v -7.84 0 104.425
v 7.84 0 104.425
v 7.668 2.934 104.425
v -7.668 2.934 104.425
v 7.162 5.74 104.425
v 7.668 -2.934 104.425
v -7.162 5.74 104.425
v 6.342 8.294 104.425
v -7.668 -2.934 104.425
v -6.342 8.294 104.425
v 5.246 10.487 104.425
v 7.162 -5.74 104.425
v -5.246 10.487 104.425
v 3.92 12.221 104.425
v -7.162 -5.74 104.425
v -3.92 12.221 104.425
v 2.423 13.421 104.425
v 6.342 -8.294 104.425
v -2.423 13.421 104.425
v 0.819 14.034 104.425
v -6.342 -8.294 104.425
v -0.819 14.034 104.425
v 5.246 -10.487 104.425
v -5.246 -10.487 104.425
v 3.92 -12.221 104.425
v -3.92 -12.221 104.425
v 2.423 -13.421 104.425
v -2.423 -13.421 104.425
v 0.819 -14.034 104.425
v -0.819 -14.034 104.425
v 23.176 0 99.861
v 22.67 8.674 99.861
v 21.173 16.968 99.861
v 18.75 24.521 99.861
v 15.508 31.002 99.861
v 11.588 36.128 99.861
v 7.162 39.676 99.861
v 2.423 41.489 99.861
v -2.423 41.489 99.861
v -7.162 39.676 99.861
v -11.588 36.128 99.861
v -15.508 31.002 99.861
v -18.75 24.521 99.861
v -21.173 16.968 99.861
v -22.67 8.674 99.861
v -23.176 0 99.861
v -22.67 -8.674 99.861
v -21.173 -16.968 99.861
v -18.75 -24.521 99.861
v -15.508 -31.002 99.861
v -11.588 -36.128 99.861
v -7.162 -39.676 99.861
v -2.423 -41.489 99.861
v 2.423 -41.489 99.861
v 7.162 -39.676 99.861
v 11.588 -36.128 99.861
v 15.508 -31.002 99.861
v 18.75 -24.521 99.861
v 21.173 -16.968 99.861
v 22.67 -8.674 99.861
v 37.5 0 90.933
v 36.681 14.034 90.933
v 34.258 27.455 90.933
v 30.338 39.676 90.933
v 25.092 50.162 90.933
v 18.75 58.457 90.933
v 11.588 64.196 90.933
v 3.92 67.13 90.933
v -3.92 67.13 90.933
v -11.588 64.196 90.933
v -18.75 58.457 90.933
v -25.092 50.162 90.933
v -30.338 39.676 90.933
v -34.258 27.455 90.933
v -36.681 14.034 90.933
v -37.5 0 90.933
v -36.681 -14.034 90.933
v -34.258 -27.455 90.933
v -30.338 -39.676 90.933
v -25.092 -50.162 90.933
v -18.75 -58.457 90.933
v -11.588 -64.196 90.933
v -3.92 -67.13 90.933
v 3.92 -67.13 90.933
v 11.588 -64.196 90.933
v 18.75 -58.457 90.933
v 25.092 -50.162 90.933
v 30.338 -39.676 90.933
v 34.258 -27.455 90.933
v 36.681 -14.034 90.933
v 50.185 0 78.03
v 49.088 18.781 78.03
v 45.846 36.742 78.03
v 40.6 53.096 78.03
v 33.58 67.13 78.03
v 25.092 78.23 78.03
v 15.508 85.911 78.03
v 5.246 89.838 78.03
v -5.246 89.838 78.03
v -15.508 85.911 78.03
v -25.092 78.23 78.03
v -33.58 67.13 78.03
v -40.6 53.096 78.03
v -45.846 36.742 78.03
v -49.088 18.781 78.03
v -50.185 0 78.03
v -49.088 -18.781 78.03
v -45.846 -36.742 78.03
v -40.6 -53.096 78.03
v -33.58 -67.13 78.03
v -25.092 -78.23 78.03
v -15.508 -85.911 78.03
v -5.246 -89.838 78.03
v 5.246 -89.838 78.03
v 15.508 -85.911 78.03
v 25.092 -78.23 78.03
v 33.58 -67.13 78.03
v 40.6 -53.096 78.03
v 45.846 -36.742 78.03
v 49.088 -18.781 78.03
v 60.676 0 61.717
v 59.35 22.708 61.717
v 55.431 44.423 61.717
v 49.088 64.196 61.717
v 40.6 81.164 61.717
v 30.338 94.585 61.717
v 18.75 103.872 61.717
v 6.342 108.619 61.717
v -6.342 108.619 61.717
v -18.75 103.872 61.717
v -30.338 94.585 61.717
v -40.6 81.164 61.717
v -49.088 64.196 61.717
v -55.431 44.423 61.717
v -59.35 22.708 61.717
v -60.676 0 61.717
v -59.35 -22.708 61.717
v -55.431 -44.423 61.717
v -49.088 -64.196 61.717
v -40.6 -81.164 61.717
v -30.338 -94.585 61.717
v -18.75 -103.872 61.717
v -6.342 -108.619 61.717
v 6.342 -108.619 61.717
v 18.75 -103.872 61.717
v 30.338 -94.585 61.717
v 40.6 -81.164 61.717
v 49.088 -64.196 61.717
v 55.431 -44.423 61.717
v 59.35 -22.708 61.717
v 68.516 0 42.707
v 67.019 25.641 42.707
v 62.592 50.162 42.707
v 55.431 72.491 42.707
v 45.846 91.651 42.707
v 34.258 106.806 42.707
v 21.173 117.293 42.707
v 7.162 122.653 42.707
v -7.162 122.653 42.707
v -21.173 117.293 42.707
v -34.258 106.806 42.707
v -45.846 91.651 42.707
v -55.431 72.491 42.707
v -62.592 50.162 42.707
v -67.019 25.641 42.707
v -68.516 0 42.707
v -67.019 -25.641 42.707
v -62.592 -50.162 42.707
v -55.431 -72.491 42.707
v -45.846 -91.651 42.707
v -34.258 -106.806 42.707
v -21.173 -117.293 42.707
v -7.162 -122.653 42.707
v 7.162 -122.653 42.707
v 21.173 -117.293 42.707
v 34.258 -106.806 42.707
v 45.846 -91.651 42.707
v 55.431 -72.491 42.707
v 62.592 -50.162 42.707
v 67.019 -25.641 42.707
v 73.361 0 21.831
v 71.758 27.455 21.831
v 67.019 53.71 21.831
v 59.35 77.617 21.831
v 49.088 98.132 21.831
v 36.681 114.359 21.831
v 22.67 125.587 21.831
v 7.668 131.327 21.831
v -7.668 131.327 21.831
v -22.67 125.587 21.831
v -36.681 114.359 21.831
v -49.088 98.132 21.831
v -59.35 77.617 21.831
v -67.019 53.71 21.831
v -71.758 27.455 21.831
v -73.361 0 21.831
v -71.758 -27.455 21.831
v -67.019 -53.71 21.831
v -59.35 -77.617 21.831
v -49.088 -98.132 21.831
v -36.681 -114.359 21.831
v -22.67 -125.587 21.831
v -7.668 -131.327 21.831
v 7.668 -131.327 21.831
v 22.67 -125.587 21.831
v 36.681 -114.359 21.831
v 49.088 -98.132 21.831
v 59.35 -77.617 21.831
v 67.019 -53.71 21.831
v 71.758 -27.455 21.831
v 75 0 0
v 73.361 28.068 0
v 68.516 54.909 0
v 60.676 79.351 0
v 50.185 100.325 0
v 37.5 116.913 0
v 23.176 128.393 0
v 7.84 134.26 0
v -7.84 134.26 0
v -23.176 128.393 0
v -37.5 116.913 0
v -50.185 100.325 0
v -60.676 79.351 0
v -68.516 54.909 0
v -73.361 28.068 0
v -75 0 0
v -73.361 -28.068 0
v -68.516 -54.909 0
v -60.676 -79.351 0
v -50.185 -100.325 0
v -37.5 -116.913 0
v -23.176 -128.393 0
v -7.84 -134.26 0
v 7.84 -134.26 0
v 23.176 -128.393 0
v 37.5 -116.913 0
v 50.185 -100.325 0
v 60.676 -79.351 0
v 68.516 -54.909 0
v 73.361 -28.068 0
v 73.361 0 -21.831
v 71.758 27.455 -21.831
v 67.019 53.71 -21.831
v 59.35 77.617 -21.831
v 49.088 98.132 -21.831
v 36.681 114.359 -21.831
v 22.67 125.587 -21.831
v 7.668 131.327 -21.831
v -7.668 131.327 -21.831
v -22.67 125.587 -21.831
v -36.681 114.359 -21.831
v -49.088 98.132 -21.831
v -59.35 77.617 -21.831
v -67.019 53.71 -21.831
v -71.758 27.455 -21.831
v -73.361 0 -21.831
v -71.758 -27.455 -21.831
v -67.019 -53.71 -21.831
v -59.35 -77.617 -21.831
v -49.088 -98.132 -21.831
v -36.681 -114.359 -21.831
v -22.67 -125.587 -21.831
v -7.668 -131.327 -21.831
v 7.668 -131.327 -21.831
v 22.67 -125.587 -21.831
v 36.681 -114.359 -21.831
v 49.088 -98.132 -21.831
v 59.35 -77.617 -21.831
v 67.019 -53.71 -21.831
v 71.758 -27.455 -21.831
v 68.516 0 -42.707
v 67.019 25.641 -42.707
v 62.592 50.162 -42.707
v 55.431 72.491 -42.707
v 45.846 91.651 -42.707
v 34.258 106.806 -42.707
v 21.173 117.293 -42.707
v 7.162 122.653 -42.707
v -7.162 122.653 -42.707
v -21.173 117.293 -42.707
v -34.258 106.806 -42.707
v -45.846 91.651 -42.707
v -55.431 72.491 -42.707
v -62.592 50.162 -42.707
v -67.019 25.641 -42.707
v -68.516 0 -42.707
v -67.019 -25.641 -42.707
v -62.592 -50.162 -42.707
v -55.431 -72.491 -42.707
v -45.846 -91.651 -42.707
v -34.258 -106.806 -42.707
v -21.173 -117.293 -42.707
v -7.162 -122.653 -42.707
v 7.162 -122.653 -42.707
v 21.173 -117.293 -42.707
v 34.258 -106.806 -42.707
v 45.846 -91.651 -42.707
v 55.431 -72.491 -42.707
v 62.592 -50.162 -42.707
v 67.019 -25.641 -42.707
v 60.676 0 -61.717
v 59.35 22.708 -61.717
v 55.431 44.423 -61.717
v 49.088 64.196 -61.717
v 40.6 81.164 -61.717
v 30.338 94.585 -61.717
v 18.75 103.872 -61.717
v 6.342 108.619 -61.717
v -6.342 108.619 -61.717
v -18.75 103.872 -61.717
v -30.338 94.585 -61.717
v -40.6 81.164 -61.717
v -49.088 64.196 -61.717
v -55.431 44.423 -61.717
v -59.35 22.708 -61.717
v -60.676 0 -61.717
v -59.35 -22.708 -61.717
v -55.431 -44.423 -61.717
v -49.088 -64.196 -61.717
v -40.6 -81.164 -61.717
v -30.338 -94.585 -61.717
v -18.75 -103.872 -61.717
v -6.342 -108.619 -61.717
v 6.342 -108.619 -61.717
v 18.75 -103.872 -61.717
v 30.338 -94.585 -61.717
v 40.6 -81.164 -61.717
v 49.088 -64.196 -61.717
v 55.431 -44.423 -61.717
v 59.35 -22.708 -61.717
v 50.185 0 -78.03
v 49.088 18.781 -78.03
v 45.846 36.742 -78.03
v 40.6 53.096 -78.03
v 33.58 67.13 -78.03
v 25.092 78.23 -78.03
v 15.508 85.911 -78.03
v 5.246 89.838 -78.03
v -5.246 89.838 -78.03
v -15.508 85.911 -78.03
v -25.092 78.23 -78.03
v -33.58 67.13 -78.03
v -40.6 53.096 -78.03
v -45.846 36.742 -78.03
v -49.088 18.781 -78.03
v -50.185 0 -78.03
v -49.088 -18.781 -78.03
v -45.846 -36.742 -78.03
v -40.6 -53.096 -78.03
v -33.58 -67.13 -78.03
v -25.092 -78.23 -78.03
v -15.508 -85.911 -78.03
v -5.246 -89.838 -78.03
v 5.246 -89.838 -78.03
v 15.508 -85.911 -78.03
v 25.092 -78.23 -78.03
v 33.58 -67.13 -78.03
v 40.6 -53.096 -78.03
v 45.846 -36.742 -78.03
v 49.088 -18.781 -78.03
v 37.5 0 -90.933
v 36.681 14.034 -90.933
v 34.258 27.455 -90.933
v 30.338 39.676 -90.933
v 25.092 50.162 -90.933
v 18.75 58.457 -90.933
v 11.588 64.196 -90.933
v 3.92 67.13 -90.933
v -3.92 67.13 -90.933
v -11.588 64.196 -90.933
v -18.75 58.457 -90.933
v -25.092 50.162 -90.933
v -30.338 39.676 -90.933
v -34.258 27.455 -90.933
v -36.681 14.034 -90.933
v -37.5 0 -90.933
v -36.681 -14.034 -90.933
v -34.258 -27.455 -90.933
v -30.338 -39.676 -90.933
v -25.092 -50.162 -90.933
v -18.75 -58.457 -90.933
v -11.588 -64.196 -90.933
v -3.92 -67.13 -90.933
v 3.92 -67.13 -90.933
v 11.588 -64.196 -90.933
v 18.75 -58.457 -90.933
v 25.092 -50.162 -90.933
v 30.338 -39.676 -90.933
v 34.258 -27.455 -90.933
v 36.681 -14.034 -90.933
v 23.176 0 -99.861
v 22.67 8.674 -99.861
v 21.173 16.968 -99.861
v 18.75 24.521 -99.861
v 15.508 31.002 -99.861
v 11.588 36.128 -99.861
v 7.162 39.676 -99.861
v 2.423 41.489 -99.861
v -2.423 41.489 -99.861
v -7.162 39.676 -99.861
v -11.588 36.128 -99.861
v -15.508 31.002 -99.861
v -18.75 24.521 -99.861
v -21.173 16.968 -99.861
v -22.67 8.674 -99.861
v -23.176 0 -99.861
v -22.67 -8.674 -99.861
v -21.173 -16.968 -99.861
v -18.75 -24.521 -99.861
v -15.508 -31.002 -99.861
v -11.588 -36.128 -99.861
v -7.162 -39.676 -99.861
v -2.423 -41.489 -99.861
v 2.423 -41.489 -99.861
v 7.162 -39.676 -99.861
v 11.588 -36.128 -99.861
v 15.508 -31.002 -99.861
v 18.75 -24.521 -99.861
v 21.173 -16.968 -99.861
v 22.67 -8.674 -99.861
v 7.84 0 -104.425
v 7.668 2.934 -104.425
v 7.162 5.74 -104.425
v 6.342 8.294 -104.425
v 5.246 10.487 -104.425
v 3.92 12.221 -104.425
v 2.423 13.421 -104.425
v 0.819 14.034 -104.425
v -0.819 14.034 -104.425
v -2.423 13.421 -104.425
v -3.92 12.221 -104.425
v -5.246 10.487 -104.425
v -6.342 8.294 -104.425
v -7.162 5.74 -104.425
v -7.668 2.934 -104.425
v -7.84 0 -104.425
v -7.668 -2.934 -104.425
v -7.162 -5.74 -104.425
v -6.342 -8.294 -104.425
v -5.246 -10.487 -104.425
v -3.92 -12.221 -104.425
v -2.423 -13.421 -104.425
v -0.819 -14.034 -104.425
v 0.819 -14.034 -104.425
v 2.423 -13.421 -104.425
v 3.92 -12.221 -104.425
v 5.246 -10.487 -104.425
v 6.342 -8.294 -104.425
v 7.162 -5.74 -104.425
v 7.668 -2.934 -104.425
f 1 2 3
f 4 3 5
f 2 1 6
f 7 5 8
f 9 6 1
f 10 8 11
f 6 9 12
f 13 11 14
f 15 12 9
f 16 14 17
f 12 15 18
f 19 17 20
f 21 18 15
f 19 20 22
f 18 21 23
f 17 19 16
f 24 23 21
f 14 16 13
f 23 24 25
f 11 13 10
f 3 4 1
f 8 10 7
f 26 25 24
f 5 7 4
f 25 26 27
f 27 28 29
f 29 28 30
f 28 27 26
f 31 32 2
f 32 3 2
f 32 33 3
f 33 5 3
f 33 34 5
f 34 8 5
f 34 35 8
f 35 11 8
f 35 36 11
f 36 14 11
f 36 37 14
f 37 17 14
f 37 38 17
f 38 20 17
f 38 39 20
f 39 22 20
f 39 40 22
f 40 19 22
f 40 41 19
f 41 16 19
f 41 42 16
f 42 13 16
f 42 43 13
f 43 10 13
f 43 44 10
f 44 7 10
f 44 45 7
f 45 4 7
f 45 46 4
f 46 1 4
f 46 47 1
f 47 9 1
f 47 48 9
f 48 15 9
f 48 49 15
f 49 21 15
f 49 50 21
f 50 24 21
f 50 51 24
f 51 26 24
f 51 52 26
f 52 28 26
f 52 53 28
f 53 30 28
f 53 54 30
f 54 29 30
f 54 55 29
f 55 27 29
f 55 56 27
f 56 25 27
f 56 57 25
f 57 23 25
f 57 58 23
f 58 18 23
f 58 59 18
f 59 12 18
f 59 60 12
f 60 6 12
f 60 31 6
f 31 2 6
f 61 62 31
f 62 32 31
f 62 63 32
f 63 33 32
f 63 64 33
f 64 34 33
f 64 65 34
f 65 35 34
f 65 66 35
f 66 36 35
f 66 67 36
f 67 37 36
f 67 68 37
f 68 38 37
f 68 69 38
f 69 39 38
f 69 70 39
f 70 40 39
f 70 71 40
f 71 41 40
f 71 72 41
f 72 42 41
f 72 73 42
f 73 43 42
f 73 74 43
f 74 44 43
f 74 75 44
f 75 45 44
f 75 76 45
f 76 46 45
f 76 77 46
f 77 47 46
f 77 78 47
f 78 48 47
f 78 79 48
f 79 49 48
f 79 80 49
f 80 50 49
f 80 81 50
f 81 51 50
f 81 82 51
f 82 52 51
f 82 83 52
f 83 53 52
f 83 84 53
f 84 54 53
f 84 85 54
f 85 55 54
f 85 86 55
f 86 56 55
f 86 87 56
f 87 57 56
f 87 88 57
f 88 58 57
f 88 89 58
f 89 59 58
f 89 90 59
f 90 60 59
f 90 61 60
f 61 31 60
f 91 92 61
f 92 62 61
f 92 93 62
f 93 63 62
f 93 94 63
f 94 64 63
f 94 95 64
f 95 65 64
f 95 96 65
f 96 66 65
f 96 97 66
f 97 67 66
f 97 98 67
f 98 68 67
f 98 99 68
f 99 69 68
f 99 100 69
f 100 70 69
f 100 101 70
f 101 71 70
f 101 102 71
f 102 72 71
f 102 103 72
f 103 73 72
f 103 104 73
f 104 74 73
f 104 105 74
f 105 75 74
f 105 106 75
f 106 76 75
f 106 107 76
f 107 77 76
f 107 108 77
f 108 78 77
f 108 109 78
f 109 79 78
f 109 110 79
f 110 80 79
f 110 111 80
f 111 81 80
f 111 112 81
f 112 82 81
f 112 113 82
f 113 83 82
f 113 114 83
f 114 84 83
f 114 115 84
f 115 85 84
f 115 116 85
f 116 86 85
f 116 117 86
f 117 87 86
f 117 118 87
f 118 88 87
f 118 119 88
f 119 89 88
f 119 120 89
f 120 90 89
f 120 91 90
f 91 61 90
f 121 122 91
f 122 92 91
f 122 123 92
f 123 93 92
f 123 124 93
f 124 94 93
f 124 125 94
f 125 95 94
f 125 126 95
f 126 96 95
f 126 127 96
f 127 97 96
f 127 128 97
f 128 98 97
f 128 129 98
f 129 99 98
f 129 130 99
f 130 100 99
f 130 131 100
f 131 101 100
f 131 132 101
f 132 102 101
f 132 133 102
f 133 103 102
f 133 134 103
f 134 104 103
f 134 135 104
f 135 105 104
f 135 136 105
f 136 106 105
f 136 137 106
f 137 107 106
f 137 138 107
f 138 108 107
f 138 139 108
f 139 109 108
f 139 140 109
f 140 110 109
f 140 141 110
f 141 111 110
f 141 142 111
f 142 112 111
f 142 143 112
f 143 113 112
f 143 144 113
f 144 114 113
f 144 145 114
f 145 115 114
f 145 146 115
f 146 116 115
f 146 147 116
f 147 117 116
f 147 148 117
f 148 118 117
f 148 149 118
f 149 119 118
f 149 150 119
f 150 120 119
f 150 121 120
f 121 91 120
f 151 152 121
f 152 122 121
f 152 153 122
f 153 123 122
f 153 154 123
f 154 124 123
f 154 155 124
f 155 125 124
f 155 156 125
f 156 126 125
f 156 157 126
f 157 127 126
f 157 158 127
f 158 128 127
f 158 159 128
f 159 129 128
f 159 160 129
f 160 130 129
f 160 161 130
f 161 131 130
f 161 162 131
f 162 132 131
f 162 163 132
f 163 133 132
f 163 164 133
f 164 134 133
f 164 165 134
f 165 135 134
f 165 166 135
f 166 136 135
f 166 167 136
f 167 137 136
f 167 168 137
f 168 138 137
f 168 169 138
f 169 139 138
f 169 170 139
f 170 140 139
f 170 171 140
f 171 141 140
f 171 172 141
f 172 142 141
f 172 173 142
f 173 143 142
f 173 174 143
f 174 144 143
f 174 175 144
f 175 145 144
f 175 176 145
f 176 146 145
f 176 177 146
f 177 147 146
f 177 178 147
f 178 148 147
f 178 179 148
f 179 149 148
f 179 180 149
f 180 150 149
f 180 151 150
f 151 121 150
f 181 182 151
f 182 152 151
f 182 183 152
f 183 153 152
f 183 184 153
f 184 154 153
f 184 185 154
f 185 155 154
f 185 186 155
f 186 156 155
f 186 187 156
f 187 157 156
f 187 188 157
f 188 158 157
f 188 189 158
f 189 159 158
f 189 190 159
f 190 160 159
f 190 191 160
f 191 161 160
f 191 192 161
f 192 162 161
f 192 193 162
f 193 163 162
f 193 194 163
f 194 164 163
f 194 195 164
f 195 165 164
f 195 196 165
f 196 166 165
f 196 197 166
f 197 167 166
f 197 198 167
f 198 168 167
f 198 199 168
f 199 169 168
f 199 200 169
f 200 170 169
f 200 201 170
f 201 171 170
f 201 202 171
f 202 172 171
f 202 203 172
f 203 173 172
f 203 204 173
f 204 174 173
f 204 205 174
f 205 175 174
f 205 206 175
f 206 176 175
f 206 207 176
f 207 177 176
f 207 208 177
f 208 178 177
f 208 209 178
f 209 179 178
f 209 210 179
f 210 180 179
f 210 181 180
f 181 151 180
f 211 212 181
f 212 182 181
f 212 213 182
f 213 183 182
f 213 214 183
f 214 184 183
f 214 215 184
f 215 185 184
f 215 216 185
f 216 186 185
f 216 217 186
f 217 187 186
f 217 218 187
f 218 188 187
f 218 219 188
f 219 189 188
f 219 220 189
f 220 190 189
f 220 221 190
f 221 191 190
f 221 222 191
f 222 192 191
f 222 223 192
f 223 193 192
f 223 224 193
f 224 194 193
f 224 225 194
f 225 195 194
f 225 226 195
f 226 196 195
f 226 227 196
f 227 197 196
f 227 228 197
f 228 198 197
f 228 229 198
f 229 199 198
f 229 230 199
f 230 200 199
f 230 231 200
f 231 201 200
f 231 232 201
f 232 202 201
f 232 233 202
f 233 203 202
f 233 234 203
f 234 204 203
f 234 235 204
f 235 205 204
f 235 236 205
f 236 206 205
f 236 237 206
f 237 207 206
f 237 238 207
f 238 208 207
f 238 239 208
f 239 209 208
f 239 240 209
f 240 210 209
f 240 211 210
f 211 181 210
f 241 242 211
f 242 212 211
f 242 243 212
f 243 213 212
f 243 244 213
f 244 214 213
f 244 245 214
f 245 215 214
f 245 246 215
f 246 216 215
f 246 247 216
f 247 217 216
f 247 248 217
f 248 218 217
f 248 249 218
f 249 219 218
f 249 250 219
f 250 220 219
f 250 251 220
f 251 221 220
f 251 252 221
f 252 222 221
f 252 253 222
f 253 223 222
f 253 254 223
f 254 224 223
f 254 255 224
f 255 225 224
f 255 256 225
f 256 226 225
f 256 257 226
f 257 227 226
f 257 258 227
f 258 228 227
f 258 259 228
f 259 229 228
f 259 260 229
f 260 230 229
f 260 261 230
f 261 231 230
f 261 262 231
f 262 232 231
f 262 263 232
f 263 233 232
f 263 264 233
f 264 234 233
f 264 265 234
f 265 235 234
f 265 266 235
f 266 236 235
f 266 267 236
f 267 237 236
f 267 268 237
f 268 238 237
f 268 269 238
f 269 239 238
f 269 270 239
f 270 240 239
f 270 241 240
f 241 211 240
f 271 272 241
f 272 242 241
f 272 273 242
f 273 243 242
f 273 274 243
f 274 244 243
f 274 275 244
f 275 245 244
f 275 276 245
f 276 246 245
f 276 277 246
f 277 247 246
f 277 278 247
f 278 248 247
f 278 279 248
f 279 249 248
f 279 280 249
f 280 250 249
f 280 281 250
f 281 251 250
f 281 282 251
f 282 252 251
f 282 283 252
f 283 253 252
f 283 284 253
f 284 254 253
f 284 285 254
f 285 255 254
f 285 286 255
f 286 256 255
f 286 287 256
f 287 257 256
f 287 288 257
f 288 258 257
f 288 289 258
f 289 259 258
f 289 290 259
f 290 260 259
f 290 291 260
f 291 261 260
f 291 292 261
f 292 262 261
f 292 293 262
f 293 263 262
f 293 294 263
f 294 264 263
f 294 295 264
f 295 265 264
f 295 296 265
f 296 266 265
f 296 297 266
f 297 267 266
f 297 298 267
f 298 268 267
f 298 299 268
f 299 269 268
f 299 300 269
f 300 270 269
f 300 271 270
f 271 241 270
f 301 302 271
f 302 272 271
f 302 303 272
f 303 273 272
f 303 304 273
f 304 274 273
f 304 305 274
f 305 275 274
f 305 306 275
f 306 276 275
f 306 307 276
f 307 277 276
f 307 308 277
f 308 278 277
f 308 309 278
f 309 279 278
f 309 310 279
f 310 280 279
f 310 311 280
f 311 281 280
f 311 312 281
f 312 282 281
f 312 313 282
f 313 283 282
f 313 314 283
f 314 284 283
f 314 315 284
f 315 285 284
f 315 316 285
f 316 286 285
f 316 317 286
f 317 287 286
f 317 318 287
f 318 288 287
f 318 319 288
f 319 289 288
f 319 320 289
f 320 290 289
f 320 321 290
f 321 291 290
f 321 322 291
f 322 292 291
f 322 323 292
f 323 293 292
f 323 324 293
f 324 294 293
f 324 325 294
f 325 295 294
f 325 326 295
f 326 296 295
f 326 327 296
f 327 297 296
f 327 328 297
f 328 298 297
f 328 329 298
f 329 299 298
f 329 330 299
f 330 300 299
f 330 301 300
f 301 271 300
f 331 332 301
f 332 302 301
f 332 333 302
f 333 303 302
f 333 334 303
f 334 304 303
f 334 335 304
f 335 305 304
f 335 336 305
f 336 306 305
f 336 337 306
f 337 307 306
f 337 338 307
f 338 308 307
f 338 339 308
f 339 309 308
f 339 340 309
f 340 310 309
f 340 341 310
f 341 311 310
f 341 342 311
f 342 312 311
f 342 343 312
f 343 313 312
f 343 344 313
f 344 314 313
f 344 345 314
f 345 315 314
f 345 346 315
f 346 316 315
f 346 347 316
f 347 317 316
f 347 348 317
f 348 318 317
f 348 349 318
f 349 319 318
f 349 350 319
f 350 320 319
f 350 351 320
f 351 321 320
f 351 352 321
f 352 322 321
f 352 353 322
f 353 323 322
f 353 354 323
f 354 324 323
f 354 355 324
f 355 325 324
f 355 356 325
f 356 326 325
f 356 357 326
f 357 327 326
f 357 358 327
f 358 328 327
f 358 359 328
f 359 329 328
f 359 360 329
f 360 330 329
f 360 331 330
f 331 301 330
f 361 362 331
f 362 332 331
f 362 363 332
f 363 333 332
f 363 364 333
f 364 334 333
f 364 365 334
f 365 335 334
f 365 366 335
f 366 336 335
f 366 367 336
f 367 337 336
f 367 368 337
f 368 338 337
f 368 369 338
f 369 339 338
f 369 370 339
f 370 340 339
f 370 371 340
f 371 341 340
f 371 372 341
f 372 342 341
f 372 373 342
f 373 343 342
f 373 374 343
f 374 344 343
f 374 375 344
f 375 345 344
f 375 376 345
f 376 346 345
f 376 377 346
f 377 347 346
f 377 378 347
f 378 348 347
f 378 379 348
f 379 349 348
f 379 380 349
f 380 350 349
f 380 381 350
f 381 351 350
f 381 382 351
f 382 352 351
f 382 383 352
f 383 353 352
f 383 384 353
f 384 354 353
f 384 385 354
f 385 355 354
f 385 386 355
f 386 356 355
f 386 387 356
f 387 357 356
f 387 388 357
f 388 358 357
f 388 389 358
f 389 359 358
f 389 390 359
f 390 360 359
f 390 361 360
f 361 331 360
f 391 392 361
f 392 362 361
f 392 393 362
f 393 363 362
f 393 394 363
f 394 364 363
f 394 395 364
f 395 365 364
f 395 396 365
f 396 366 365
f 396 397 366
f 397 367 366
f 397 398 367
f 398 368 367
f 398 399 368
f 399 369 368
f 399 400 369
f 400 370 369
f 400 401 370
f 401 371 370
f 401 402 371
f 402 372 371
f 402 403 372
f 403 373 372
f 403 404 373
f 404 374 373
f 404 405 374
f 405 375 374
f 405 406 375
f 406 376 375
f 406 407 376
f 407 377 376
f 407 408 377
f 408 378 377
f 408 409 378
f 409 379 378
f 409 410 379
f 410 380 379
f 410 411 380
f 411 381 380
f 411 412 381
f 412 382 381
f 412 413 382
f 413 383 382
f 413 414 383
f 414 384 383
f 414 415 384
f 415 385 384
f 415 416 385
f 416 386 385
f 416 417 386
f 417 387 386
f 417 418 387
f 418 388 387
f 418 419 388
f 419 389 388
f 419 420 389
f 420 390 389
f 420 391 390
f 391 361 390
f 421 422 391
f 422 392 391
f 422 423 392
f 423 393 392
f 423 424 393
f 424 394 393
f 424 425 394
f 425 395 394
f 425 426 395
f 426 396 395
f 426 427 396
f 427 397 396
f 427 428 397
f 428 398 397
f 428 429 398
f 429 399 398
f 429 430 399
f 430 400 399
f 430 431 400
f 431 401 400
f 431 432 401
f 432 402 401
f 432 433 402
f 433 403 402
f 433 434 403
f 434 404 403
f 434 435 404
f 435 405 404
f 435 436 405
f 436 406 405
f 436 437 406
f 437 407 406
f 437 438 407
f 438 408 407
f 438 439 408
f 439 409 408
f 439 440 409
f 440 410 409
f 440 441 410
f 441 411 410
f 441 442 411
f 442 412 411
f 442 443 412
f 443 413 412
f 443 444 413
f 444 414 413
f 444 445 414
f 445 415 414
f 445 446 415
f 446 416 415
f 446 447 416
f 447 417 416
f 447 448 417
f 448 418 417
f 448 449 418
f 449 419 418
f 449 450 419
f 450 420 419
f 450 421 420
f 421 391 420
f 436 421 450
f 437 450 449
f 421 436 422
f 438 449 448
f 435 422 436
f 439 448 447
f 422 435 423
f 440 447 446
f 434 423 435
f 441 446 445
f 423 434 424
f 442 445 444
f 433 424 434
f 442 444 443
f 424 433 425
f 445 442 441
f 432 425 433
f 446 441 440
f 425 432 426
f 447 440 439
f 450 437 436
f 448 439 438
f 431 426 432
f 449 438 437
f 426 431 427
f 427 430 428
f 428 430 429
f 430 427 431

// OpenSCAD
// Generated by SolidPython 1.0.1 on 2020-07-29 00:46:46


scale(v = [5, 9, 7]) {
	sphere(r = 15);
}
/***********************************************
*********      SolidPython code:      **********
************************************************
 
# import packages: SolidPython
from solid import *
from solid.utils import *
from itertools import chain, combinations, permutations


class Resize:

    def __init__(self, scad_file):
        self.scad_file = scad_file
        #self.scad_file = import_scad(scad_file)
        # cone/cylinder param:
        self.r1 = 0
        self.r2 = 0
        self.h = 0
        # rectangular prism param:
        self.w = 0
        self.l = 0
        # ellipse param:
        self.r = 0

    # import OpenScad code (file name corresponds to shape)


    # classify shape + parameters
    def assign(self, param1, param2, param3):
        if self.scad_file == 'cone.scad':
            self.r1 = param1
            self.r2 = param2
            self.h = param3
        elif self.scad_file == 'cylinder.scad':
            self.r1 = param1
            self.r2 = param2
            self.h = param3
        elif self.scad_file == 'rectangularPrism.scad':
            self.h = param1
            self.l = param2
            self.w = param3
        else:
            self.r = param1
            self.h = param2

    # resize parameters
    def iterate(self):
        x = range(3, 20, 2)
        i = 1
        if self.scad_file == 'cone.scad':
            tempList = list(permutations(x, 2))
            for temp in tempList:
                param1 = temp[0]
                param2 = temp[1]
                filepath = 'produced_scad_files/' + 'cone' + str(param1) + '_' + str(param2) + '_' + '.scad'
                scad_render_to_file(cylinder(h=param1, r1=param2, r2=0), filepath)

        elif self.scad_file == 'cylinder.scad':
            tempList = list(permutations(x, 3))
            for temp in tempList:
                param1 = temp[0]
                param2 = temp[1]
                filepath = 'produced_scad_files/' + 'cylinder' + str(param1) + '_' + str(param2) + '_' + '.scad'
                scad_render_to_file(cylinder(h=param1, r1=param2, r2=param2), filepath)

        elif self.scad_file == 'rectangularPrism.scad':
            tempList = list(permutations(x, 3))
            for temp in tempList:
                param1 = temp[0]
                param2 = temp[1]
                param3 = temp[2]
                filepath = 'produced_scad_files/' + 'rectangularPrism' + str(param1) + '_' + str(param2) + '_' + str(
                    param3) + '.scad'
                scad_render_to_file(cube(size=(param1, param2, param3)), filepath)

        elif self.scad_file == 'ellipse.scad':
            tempList = list(permutations(x, 4))
            for temp in tempList:
                param1 = temp[0]
                param2 = temp[1]
                param3 = temp[2]
                param4 = temp[3]
                filepath = 'produced_scad_files/' + 'ellipse' + str(param1) + '_' + str(param2) + '_' + str(param3) + '_' + str(param4) + '.scad'
                scad_render_to_file(scale([param1, param2, param3])(sphere(r=param4)), filepath)

    def render_to_scadfile(self):
        scad_render_to_file(scad, 'example.scad') 
 
************************************************/
